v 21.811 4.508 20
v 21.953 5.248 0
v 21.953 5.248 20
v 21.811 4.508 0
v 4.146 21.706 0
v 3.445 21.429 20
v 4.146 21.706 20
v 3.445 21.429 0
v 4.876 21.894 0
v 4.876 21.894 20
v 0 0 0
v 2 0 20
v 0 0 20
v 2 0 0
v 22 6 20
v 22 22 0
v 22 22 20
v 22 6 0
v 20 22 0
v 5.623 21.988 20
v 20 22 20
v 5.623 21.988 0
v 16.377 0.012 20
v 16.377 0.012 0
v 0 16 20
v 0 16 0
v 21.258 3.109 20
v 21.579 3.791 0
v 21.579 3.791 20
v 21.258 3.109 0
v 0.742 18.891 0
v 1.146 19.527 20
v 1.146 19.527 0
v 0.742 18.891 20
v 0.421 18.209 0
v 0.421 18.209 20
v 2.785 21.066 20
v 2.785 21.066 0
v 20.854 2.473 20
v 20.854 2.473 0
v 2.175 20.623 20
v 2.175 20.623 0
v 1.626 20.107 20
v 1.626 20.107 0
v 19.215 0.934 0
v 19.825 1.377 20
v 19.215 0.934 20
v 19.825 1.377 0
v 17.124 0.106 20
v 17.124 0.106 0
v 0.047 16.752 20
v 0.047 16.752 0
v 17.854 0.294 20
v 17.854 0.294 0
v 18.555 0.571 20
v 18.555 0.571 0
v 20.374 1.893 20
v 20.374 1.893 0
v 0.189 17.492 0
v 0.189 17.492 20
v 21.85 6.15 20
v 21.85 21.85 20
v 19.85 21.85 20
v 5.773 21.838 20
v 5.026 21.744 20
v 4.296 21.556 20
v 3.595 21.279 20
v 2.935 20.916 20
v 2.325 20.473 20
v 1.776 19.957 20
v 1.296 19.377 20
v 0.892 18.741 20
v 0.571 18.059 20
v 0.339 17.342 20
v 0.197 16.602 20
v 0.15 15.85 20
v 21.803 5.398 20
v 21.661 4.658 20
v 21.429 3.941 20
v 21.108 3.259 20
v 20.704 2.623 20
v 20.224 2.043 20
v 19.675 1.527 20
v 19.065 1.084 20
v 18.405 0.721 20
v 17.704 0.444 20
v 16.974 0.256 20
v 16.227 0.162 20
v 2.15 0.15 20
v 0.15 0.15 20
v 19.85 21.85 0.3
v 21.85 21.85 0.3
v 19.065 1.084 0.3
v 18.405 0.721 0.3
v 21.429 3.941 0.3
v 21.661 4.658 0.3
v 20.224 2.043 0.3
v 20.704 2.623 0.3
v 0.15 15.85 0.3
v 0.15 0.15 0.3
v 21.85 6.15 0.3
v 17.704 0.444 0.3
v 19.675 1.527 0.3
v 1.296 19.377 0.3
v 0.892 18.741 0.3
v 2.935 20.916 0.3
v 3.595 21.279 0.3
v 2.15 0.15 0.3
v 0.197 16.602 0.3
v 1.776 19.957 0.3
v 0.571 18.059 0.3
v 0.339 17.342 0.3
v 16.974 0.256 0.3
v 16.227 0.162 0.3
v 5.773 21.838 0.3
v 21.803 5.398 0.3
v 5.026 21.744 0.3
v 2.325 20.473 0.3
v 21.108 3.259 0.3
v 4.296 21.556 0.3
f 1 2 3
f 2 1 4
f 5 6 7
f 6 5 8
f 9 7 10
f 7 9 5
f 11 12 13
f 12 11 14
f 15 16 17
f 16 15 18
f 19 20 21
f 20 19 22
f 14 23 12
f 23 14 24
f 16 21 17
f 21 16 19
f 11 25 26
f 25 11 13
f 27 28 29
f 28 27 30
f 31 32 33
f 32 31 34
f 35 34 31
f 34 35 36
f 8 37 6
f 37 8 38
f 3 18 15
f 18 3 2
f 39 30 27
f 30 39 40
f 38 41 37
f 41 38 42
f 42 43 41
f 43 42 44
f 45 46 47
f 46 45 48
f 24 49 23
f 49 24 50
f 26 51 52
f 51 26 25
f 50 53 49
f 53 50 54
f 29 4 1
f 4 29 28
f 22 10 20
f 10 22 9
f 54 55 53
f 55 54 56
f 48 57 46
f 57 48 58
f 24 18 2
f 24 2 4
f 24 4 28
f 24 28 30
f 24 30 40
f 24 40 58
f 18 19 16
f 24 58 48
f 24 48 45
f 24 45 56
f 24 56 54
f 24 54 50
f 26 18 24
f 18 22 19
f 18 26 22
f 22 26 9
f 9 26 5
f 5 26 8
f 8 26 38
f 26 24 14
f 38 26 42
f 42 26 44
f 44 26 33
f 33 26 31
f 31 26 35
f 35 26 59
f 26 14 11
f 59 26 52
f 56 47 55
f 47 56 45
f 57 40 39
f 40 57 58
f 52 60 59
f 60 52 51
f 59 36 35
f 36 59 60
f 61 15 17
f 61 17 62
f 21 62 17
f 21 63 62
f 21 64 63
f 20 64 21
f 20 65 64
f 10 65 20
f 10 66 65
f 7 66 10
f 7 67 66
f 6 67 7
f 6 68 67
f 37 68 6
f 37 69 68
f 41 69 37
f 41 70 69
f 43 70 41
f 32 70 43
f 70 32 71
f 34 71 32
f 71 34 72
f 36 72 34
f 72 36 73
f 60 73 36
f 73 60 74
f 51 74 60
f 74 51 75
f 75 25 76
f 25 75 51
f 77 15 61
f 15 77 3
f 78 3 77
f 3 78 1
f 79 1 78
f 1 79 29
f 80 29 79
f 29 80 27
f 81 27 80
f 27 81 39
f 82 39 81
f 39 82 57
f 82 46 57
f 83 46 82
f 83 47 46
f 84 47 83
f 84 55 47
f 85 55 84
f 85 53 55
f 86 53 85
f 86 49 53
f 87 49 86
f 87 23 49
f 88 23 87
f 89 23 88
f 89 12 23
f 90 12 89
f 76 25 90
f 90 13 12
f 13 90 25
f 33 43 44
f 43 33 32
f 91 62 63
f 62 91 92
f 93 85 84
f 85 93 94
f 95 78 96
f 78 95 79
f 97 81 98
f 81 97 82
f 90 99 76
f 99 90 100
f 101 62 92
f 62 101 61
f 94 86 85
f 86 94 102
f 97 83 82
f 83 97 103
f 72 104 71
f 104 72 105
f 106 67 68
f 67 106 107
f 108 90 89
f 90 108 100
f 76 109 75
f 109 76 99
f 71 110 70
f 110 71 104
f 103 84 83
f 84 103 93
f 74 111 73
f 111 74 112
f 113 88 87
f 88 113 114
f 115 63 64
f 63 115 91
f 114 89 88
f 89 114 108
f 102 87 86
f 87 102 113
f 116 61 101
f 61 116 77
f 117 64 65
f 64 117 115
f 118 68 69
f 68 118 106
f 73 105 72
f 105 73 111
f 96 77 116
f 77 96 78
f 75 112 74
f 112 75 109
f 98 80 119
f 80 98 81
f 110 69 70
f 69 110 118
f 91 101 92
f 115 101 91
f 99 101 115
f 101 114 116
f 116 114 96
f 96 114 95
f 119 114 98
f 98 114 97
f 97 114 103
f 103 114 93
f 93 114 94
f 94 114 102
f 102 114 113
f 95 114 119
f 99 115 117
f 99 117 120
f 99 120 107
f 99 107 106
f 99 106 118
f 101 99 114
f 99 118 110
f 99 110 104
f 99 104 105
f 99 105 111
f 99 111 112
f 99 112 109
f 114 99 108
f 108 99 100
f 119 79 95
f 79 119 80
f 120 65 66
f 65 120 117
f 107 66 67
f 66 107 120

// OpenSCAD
//thin walls
$fn=50;
rad=6;
len=2;
h=20;
wall=0.15;


//box
difference() {
	hull() {
		//outer shape
		cube([len,len,h]);
		translate([20,20,0]) cube([len,len,h]);
		translate([0+rad,20-rad+len,0]) cylinder(h,rad,rad);
		translate([20-rad+len,0+rad,0]) cylinder(h,rad,rad);
	}
	hull() {
		//inner shape
		translate([wall,wall,wall*2]) cube([len,len,h]);
		translate([20-wall,20-wall,wall*2]) cube([len,len,h]);
		translate([0+rad+wall,20-rad+len-wall,wall*2]) cylinder(h,rad,rad);
		translate([20-rad+len-wall,0+rad+wall,wall*2]) cylinder(h,rad,rad);
	}
}

/*
//lid
difference() {
	hull() {
		//outer shape
		cube([len,len,h]);
		translate([20,20,0]) cube([len,len,h]);
		translate([0+rad,20-rad+len,0]) cylinder(h,rad,rad);
		translate([20-rad+len,0+rad,0]) cylinder(h,rad,rad);
	}
	hull() {
		//inner shape
		translate([wall,wall,wall*2]) cube([len,len,h]);
		translate([20-wall,20-wall,wall*2]) cube([len,len,h]);
		translate([0+rad+wall,20-rad+len-wall,wall*2]) cylinder(h,rad,rad);
		translate([20-rad+len-wall,0+rad+wall,wall*2]) cylinder(h,rad,rad);
	}
}
*/
